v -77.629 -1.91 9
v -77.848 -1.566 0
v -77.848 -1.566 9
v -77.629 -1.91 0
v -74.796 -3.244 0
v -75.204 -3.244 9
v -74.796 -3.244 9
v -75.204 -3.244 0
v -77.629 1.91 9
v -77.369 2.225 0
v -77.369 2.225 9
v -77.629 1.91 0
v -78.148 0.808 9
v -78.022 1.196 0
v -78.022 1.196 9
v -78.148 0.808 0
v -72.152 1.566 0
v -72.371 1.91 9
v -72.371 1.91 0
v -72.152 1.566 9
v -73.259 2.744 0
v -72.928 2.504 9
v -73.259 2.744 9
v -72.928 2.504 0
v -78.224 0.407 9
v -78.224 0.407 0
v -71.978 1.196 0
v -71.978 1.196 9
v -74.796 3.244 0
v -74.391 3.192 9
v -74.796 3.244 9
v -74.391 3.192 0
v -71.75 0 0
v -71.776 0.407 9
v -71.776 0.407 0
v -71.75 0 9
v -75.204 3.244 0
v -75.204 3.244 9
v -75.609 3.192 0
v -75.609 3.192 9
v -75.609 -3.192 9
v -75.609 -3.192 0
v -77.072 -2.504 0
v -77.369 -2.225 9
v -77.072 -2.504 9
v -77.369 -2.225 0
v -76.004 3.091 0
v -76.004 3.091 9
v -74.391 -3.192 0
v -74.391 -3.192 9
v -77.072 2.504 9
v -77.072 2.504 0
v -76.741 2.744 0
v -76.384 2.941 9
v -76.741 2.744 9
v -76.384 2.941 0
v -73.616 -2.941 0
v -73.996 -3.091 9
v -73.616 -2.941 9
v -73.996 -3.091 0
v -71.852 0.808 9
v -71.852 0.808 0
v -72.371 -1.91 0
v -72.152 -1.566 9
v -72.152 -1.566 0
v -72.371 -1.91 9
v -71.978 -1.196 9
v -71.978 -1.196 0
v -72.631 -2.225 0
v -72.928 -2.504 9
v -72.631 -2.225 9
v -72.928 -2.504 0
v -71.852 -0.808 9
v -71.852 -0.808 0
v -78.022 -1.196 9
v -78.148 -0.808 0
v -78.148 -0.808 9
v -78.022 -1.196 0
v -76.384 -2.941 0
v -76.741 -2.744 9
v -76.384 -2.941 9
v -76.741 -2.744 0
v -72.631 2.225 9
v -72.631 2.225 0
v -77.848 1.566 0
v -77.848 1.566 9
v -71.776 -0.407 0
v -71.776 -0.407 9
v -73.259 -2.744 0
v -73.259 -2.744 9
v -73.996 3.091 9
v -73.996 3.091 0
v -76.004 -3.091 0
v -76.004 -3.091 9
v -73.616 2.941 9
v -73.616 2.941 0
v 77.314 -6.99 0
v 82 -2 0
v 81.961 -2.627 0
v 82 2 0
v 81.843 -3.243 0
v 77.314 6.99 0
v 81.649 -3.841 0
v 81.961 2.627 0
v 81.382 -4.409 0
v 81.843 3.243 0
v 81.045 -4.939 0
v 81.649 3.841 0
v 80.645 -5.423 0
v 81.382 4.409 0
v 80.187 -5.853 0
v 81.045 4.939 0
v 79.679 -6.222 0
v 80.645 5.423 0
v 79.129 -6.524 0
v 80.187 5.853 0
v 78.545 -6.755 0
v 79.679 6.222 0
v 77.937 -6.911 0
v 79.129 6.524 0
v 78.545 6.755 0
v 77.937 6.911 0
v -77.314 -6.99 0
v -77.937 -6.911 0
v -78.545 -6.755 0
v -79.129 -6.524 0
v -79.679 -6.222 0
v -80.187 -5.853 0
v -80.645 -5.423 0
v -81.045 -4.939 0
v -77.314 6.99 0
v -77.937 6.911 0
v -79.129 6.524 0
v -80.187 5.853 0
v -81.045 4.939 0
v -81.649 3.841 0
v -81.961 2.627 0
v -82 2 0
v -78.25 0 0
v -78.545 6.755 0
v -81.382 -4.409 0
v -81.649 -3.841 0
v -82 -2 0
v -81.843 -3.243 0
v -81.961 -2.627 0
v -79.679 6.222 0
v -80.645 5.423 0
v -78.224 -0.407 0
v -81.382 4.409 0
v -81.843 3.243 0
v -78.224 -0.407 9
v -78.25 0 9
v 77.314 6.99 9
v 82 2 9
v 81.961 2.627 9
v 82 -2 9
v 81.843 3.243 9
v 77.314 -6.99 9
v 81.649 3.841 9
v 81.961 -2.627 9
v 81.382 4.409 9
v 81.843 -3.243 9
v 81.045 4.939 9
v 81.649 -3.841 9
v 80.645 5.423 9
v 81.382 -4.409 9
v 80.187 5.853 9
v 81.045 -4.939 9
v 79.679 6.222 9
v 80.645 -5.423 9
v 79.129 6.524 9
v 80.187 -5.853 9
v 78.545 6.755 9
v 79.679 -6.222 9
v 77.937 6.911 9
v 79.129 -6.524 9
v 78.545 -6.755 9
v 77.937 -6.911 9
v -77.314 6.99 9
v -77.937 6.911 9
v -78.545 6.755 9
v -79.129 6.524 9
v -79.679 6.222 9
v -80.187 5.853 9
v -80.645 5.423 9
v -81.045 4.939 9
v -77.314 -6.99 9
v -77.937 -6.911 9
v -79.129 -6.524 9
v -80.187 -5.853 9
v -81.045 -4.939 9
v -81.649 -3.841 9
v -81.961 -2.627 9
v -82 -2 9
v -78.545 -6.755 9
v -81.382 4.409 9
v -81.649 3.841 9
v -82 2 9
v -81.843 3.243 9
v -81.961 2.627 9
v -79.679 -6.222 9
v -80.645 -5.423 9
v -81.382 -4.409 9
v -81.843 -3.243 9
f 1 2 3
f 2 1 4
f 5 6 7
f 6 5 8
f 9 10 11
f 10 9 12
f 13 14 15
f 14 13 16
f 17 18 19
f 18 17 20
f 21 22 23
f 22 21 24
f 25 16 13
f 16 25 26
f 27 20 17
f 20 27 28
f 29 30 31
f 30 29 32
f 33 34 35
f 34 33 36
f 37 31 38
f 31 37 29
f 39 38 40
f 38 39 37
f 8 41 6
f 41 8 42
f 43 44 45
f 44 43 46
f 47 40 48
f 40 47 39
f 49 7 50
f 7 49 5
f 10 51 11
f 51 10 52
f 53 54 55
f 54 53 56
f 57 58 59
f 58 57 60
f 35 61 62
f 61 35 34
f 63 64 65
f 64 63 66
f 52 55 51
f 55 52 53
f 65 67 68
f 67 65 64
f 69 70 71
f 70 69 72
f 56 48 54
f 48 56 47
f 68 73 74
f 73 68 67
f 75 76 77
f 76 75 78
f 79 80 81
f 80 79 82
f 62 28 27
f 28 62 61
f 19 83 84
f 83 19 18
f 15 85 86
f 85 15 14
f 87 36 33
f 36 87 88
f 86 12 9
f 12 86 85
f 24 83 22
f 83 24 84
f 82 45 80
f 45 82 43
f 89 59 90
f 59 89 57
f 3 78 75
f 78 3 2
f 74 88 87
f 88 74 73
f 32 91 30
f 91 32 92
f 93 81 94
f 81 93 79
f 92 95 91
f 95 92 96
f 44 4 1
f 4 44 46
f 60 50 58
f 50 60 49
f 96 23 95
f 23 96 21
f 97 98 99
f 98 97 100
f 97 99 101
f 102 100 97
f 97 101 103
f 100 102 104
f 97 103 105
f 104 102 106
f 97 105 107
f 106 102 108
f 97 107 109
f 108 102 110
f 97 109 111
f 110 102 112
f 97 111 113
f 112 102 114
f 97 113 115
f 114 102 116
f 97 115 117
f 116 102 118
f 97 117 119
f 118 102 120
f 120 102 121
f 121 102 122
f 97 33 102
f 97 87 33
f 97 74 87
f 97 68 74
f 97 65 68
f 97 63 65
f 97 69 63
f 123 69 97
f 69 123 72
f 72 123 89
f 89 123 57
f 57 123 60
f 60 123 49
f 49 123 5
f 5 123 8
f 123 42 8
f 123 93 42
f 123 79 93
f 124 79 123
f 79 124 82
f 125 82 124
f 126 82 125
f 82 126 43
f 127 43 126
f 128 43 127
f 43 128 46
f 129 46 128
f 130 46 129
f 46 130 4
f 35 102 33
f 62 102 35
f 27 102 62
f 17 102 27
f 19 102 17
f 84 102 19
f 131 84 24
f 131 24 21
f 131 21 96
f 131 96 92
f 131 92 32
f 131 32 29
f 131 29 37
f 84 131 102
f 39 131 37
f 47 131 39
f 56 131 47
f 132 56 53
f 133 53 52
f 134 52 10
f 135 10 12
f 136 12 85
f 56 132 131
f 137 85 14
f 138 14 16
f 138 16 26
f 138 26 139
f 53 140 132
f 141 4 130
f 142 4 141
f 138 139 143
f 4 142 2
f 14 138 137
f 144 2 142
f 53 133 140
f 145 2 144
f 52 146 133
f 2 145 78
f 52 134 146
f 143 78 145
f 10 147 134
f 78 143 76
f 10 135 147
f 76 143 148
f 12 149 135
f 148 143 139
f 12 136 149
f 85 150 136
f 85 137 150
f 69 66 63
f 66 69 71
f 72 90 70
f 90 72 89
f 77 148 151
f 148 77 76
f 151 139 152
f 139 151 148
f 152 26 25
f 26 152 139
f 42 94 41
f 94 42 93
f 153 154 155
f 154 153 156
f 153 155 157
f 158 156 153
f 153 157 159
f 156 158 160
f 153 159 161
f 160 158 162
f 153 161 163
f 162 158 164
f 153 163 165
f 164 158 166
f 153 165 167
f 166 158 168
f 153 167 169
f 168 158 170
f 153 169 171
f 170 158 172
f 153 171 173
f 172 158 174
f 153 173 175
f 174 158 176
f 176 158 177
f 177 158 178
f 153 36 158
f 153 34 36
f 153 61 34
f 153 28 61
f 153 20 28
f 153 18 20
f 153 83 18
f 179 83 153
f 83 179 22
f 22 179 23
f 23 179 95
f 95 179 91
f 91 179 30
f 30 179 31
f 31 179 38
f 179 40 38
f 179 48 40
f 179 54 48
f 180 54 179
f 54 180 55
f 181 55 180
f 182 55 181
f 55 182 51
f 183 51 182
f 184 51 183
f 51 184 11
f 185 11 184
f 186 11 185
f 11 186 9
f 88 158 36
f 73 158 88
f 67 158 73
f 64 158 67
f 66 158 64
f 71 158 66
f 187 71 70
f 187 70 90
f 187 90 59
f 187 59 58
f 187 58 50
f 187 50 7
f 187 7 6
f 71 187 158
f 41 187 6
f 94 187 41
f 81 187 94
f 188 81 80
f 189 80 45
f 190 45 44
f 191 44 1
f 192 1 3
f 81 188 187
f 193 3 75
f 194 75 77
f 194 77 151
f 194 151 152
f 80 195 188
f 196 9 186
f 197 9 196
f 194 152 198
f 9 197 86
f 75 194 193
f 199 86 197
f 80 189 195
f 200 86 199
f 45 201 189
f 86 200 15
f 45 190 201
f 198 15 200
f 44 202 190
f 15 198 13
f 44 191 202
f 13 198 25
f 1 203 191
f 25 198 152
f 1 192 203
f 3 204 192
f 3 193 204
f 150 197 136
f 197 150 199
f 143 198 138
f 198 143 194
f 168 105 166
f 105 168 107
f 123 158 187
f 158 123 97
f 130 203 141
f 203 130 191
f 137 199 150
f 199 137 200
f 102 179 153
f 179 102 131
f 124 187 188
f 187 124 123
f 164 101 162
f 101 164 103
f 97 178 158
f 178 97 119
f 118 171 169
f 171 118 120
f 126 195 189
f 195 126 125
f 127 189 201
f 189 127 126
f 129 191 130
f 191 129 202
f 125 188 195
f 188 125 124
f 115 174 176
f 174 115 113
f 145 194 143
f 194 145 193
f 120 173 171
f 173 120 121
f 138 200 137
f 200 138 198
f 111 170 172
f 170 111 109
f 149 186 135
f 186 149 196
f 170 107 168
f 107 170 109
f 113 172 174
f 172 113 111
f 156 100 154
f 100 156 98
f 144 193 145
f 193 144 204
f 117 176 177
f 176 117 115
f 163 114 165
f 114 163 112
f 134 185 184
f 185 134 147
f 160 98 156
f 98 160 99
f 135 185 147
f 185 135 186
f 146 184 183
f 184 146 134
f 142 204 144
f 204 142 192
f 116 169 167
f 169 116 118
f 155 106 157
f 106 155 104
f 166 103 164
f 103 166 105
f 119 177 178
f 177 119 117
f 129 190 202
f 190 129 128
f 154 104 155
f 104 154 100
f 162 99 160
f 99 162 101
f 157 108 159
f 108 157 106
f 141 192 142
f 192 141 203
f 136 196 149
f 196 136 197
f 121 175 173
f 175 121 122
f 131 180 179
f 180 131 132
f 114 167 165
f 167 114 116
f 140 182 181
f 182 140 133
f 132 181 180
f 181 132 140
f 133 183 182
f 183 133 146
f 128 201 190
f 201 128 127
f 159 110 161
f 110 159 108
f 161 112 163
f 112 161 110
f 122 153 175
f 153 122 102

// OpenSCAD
$fn = 50;


difference() {
	union() {
		hull() {
			translate(v = [-77.0000000000, 2.0000000000, 0]) {
				cylinder(h = 9, r = 5);
			}
			translate(v = [77.0000000000, 2.0000000000, 0]) {
				cylinder(h = 9, r = 5);
			}
			translate(v = [-77.0000000000, -2.0000000000, 0]) {
				cylinder(h = 9, r = 5);
			}
			translate(v = [77.0000000000, -2.0000000000, 0]) {
				cylinder(h = 9, r = 5);
			}
		}
	}
	union() {
		translate(v = [-75.0000000000, 0.0000000000, 0]) {
			cylinder(h = 9, r = 3.2500000000);
		}
		translate(v = [-75.0000000000, 0.0000000000, 0]) {
			cylinder(h = 9, r = 1.8000000000);
		}
		translate(v = [-75.0000000000, 0.0000000000, 0]) {
			cylinder(h = 9, r = 1.8000000000);
		}
		translate(v = [-75.0000000000, 0.0000000000, 0]) {
			cylinder(h = 9, r = 1.8000000000);
		}
	}
}
